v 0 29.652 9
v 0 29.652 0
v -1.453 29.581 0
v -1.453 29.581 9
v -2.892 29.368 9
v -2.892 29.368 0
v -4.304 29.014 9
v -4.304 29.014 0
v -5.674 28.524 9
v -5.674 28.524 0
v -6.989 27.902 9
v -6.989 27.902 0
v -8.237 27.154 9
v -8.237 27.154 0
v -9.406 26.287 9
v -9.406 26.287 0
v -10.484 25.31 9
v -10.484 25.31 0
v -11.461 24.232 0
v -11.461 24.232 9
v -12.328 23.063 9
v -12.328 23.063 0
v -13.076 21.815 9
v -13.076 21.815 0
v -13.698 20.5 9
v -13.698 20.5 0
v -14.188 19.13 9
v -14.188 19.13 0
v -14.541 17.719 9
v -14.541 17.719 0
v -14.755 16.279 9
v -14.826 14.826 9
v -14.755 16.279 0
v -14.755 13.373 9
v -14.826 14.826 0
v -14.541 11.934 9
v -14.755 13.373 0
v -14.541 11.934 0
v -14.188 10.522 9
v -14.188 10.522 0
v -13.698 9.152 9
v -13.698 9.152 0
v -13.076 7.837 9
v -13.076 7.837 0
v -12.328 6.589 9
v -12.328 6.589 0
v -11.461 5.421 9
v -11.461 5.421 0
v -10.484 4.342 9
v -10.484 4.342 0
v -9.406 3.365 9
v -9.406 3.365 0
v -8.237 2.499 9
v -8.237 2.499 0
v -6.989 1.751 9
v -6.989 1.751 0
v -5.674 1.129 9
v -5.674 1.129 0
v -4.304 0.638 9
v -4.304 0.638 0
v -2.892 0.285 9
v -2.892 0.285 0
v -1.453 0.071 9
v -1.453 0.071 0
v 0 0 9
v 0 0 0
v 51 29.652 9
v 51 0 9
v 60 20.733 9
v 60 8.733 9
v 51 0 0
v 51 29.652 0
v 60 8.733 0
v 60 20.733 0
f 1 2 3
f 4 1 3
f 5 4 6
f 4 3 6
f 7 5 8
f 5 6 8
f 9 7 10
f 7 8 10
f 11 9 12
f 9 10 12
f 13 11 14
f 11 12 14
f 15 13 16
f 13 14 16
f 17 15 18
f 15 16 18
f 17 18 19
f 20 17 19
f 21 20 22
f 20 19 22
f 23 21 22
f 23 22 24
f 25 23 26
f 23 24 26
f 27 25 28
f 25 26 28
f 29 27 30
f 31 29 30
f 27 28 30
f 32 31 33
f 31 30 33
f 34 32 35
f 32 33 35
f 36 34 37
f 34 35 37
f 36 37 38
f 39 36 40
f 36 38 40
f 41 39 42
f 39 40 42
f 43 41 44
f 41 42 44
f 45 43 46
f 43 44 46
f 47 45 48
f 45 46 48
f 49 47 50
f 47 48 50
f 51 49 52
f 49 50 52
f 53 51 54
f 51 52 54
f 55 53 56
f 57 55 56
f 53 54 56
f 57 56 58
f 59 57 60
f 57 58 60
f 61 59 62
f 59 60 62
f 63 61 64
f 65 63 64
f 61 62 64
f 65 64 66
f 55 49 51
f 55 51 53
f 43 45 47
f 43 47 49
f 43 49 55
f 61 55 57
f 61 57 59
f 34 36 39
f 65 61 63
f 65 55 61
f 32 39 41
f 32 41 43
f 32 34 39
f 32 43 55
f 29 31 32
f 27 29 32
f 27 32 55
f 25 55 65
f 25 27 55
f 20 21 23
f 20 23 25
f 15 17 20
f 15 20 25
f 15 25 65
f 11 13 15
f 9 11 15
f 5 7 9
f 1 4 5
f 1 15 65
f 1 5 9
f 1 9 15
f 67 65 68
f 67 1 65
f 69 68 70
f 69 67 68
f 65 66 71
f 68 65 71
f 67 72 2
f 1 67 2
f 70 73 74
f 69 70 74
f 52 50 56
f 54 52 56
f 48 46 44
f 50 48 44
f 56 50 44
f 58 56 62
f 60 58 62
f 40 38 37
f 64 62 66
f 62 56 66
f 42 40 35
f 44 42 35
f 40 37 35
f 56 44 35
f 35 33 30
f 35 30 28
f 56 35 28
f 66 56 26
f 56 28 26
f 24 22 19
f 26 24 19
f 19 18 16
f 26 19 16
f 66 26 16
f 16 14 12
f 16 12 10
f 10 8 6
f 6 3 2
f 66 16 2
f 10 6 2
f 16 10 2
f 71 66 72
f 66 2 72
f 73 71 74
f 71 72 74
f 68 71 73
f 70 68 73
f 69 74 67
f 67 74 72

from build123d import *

# Parameters (mm, degrees)
F0_W     = 18
F0_H     = 29.6524400212
F1_DEPTH = 9


# Not quite as in the source:
# - a feature names something its author has since deleted; it is built from what else it names


with BuildPart() as f1:
    # F0 (on Top) → F1 (new body)
    with BuildSketch(Plane.XY):
        with Locations((9, 14.8262200106)):
            Rectangle(F0_W, F0_H)
        with BuildLine():
            ThreePointArc((0, 29.6524400212), (-14.8262200106, 14.8262200106), (0, 0))
            Line((0, 0), (0, 29.6524400212))
        make_face()
        Polygon((18, 29.6524400212), (18, 0), (51, 0), (60, 8.7334750722), (60, 20.7334750722), (51, 29.6524400212), align=None)
    extrude(amount=F1_DEPTH)


solid = f1.part
